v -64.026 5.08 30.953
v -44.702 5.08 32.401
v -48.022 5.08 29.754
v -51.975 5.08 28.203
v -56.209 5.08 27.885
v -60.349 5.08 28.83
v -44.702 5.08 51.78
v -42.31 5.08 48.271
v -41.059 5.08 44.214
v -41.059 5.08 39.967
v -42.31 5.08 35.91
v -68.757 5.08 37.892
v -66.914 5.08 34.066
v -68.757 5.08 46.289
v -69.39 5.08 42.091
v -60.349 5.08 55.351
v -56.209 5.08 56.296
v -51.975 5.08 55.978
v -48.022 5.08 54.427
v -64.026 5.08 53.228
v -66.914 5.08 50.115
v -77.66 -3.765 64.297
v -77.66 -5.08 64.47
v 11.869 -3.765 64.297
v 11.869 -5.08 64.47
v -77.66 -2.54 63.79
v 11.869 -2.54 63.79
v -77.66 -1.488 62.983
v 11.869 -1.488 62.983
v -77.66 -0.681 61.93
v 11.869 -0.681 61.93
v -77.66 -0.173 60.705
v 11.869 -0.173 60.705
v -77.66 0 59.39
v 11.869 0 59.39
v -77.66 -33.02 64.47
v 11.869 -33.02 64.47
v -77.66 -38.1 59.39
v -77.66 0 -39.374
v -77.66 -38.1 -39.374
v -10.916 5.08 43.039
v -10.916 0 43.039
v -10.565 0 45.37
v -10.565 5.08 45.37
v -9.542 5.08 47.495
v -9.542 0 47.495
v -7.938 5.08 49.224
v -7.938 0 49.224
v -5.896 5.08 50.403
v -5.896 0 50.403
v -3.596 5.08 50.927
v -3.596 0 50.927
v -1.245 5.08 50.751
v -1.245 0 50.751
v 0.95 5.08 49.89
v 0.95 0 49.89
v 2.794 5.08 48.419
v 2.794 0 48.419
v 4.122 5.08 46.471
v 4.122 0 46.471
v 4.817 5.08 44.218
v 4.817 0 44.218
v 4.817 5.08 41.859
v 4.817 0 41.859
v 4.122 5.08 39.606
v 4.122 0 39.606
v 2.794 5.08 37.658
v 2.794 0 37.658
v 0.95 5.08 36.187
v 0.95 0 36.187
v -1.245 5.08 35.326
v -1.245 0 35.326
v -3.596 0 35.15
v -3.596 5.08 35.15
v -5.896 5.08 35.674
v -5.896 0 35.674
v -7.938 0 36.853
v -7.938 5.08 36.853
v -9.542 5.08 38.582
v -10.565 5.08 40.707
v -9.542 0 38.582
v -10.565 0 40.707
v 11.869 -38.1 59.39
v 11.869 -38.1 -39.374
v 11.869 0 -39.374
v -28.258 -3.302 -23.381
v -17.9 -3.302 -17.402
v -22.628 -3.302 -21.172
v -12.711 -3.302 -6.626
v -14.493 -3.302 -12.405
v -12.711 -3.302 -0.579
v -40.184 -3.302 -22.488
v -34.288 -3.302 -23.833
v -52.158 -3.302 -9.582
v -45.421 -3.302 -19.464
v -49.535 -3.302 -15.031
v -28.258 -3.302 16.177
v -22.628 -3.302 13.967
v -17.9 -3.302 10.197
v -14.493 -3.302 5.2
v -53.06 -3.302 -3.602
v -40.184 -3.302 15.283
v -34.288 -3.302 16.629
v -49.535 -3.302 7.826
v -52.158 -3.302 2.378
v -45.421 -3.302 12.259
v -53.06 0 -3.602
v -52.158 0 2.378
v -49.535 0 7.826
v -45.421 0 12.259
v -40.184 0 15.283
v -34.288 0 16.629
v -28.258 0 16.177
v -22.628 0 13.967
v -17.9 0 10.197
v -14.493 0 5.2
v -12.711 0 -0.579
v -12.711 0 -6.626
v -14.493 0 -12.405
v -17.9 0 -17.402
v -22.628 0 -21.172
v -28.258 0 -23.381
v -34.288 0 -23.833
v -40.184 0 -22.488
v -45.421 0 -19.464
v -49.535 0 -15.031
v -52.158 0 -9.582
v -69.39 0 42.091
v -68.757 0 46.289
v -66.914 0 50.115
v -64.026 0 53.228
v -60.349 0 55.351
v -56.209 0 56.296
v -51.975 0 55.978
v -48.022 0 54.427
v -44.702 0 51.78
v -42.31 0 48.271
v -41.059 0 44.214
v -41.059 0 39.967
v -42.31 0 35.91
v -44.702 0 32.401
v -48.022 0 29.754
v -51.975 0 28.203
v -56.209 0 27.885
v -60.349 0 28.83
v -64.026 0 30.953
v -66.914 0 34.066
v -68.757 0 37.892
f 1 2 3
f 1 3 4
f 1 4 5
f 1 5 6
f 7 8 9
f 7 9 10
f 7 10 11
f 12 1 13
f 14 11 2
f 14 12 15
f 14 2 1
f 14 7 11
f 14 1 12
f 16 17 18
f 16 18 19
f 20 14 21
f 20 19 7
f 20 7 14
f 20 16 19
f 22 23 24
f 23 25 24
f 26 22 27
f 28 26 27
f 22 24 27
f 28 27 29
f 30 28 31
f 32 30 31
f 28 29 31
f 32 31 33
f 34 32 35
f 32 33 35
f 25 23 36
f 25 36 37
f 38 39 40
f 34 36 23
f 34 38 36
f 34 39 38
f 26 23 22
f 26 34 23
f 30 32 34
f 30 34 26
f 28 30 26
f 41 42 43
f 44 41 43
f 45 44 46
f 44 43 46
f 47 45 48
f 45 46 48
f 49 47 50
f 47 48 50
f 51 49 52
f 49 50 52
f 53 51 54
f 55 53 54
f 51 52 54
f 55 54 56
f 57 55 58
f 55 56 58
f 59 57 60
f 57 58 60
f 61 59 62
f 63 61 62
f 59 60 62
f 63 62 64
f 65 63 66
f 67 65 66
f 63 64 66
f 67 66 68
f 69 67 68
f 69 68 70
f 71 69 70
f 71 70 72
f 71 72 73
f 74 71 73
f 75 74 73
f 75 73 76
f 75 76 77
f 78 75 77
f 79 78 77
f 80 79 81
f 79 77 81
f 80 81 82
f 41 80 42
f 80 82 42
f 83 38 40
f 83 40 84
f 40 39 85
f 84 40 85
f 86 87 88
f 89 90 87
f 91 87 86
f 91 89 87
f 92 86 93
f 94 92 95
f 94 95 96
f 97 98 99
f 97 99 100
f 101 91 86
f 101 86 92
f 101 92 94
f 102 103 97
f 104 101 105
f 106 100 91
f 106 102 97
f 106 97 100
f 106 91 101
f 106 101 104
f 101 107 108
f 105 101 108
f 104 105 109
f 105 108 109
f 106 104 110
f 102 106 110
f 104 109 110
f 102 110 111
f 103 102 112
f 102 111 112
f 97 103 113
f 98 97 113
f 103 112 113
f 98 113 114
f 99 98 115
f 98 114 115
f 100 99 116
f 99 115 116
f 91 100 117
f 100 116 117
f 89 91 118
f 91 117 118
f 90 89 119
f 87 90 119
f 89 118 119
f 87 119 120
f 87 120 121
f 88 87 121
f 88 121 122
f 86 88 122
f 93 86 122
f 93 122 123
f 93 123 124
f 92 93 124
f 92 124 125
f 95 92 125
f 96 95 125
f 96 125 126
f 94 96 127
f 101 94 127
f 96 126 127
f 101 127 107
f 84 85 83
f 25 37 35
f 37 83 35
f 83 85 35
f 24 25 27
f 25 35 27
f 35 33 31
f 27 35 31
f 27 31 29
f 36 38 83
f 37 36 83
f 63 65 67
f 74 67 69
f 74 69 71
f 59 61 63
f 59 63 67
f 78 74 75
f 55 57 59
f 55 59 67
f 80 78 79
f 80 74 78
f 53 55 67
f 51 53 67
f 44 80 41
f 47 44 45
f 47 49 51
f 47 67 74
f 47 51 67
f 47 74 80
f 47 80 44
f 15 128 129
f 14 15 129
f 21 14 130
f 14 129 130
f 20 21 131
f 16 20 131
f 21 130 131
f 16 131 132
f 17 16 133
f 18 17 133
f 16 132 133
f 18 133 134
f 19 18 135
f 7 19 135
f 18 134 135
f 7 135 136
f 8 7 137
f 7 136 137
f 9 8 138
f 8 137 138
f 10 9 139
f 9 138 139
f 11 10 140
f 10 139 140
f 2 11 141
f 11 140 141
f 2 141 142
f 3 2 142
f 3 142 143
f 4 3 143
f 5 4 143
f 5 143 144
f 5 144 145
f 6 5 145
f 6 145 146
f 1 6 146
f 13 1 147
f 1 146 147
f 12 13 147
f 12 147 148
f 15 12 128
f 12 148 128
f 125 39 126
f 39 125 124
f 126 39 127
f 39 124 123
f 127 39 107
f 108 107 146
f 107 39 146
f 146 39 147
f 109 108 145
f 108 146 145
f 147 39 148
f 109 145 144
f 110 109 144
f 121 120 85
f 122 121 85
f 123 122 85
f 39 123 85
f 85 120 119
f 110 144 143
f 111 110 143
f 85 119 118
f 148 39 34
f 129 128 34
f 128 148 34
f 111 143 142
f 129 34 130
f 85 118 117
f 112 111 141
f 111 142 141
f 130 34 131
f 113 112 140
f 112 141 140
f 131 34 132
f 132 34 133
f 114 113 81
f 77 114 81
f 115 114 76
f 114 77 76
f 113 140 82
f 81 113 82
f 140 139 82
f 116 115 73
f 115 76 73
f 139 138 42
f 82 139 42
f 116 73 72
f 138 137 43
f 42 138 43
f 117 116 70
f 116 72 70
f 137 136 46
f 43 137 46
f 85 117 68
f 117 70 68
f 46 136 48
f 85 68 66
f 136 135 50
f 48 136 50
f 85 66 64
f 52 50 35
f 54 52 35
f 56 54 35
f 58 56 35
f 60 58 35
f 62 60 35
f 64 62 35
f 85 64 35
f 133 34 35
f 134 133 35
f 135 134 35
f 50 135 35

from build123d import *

# Parameters (mm, degrees)
F0_W     = 89.529717
F0_H     = 103.844382
F1_DEPTH = 38.1
F2_SIZE  = 5.08
F3_R     = 5.08
F4_R     = 20.287785
F5_DEPTH = 3.302
F6_R     = 7.910996
F6_R_2   = 14.245045
F7_DEPTH = 5.08


with BuildPart() as f1:
    # F0 (on Front) → F1 (new body)
    with BuildSketch(Plane.XZ):
        with Locations((-32.89539, 12.548234)):
            Rectangle(F0_W, F0_H)
    extrude(amount=F1_DEPTH)

    # F2
    f2_edges = [f1.edges().sort_by_distance(p)[0] for p in [
        (-32.895389, -38.1, 64.470425),
    ]]
    chamfer(f2_edges, length=F2_SIZE)

    # F3
    f3_edges = [f1.edges().sort_by_distance(p)[0] for p in [
        (-32.895389, 0, 64.470425),
    ]]
    fillet(f3_edges, radius=F3_R)

    # F4 (on face) → F5 (cut)
    with BuildSketch(Plane(origin=(0, 0, 0), x_dir=(-1, 0, 0), z_dir=(0, 1, 0))):
        with Locations((32.772042, -3.602346)):
            Circle(F4_R)
    extrude(amount=-F5_DEPTH, mode=Mode.SUBTRACT)

    # F6 (on face) → F7 (join)
    with BuildSketch(Plane(origin=(0, 0, 0), x_dir=(-1, 0, 0), z_dir=(0, 1, 0))):
        with Locations((3.005289, 43.038554)):
            Circle(F6_R)
        with Locations((55.144507, 42.090569)):
            Circle(F6_R_2)
    extrude(amount=F7_DEPTH)


solid = f1.part
